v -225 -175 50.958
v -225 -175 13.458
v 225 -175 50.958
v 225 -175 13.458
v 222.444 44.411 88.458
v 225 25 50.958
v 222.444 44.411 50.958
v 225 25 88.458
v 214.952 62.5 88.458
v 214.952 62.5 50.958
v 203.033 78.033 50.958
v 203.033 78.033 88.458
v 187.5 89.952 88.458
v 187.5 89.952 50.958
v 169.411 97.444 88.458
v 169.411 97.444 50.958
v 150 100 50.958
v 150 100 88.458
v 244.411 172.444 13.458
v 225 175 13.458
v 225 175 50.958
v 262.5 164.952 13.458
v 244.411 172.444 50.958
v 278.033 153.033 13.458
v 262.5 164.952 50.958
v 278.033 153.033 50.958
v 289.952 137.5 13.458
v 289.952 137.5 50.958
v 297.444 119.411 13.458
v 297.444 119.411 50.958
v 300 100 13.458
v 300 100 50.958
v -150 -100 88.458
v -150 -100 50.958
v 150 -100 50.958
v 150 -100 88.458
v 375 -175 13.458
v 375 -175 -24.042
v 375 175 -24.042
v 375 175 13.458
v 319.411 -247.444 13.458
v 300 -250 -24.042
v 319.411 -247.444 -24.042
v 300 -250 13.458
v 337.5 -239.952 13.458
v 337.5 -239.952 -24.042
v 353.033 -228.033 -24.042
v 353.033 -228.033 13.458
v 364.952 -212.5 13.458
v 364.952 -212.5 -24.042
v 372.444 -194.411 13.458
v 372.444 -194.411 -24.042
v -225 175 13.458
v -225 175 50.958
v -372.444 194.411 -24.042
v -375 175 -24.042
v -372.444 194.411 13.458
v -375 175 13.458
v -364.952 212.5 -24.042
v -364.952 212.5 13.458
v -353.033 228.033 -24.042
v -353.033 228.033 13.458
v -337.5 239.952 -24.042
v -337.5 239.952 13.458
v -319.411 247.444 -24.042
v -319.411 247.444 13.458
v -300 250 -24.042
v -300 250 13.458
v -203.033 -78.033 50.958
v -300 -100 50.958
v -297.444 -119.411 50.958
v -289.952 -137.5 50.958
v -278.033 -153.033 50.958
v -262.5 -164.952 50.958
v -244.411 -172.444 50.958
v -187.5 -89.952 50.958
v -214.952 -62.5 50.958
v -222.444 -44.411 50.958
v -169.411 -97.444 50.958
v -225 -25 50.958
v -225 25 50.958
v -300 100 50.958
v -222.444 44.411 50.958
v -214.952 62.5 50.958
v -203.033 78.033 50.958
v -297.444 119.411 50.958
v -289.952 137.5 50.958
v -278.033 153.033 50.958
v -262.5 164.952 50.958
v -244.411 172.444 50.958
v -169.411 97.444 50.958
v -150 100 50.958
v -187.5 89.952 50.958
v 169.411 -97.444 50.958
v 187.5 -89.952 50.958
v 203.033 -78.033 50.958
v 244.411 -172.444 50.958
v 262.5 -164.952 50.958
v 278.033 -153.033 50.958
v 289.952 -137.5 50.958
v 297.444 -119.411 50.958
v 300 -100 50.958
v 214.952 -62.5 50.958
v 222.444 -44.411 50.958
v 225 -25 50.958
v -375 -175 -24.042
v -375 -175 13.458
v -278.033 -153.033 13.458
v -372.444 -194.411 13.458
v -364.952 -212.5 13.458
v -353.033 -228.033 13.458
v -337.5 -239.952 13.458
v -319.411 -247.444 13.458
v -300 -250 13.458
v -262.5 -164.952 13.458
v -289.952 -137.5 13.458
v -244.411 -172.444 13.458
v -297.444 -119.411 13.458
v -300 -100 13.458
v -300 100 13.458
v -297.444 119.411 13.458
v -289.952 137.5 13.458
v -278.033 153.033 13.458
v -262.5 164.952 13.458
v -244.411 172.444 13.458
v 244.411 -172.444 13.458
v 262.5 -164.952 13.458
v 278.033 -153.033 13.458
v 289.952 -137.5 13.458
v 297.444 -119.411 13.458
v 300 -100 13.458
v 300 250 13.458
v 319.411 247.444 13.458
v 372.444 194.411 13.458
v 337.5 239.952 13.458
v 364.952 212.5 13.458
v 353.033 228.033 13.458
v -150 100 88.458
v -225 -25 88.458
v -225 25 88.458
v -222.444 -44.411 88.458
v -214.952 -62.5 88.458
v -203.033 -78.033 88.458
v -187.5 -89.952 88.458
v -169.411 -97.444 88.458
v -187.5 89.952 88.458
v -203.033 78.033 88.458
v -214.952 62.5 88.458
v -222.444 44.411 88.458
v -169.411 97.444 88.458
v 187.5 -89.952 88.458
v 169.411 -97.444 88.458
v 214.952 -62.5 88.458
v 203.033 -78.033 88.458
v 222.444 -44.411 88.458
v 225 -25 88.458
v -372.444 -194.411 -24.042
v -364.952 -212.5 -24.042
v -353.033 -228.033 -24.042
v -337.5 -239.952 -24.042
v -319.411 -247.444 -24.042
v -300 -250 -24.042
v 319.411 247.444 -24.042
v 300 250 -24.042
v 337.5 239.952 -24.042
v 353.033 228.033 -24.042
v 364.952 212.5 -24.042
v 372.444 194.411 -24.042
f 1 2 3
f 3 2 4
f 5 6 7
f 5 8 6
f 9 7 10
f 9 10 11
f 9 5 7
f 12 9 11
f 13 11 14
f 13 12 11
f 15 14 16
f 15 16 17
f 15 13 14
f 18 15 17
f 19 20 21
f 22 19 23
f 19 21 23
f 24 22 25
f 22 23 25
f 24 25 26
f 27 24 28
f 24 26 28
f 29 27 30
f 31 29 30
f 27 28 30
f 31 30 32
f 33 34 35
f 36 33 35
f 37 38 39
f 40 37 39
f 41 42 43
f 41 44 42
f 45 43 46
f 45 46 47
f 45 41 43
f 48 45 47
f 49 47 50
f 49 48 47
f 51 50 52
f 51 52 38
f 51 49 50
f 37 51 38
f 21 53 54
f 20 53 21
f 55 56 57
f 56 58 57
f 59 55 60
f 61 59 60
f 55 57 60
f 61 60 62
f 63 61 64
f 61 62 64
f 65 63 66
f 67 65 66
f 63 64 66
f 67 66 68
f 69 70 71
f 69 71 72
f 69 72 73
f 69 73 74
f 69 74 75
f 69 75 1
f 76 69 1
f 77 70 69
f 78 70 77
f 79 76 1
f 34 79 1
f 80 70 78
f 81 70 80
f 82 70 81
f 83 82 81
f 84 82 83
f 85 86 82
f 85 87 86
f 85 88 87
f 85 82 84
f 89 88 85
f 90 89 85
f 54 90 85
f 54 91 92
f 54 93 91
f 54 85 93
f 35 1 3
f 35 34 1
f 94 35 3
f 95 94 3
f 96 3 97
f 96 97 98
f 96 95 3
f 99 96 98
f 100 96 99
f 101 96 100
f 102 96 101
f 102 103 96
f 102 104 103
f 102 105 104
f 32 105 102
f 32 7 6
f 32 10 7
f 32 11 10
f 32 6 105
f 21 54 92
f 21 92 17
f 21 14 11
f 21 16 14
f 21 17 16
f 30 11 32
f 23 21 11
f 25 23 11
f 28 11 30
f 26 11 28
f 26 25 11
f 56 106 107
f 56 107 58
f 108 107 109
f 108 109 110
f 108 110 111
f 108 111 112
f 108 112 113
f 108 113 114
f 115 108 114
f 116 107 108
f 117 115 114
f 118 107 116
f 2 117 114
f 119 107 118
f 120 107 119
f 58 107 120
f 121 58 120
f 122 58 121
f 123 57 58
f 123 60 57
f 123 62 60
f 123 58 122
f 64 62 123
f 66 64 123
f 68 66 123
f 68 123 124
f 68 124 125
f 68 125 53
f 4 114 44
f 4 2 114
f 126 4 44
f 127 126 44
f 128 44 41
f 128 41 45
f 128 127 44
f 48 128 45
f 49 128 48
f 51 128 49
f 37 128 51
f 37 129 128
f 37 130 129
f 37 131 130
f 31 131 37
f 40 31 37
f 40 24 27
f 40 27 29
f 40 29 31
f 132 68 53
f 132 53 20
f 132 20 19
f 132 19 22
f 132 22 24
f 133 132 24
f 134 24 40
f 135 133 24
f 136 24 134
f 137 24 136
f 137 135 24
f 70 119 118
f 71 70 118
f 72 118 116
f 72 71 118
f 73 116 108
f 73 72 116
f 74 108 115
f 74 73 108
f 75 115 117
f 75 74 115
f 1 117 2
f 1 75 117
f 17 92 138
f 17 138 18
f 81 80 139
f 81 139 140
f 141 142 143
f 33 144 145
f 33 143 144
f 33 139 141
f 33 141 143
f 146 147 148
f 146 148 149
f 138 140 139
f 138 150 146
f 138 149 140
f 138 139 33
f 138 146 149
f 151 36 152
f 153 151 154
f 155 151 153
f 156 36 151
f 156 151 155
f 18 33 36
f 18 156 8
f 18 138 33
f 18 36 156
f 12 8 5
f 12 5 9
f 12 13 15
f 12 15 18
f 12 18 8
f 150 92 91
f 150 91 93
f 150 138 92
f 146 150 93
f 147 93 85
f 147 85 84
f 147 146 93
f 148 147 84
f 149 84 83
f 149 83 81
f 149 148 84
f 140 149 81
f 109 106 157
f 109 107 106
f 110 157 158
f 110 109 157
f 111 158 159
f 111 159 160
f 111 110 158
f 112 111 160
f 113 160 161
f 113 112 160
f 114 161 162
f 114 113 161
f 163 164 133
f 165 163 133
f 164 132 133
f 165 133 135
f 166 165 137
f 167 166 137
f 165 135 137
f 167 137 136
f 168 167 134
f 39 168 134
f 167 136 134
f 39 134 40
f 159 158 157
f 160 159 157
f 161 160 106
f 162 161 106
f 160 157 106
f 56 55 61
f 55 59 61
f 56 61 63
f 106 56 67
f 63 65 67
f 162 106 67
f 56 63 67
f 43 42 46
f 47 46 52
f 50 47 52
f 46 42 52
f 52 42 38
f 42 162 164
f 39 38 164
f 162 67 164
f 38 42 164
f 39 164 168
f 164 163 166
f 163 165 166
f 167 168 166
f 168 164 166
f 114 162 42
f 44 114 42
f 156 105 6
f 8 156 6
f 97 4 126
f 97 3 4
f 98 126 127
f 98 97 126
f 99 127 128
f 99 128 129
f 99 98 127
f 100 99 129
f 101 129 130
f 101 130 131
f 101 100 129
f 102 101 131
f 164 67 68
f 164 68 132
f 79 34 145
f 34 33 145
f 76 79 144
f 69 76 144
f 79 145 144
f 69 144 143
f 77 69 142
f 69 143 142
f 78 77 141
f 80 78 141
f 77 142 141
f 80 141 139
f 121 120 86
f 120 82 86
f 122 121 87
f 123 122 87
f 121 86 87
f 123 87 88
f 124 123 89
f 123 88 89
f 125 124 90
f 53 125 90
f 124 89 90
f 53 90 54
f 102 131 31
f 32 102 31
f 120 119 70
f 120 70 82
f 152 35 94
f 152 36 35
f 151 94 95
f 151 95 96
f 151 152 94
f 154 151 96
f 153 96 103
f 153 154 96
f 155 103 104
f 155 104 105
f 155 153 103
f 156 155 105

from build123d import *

# Parameters (mm, degrees)
SKETCH2_W           = 300
SKETCH2_H           = 200
BOSS_EXTRUDE1_DEPTH = 15
SKETCH3_W           = 240
SKETCH3_H           = 140
BOSS_EXTRUDE2_DEPTH = 15
SKETCH4_W           = 180
SKETCH4_H           = 80
BOSS_EXTRUDE3_DEPTH = 15
FILLET1_R           = 30
FILLET2_R           = 30
FILLET3_R           = 30
SCALE2_SCALE        = 2.5


with BuildPart() as part:
    # Sketch2 → Boss-Extrude1 (new body)
    with BuildSketch(Plane.XY):
        Rectangle(SKETCH2_W, SKETCH2_H)
    extrude(amount=BOSS_EXTRUDE1_DEPTH)

    # Sketch3 → Boss-Extrude2 (add)
    with BuildSketch(Plane.XY.offset(15)):
        Rectangle(SKETCH3_W, SKETCH3_H)
    extrude(amount=BOSS_EXTRUDE2_DEPTH)

    # Sketch4 → Boss-Extrude3 (add)
    with BuildSketch(Plane.XY.offset(30)):
        Rectangle(SKETCH4_W, SKETCH4_H)
    extrude(amount=BOSS_EXTRUDE3_DEPTH)

    # Fillet1
    fillet1_edges = [part.edges().sort_by_distance(p)[0] for p in [
        (-90, 40, 37.5),
        (-90, -40, 37.5),
        (90, -40, 37.5),
        (90, 40, 37.5),
    ]]
    fillet(fillet1_edges, radius=FILLET1_R)

    # Fillet2
    fillet2_edges = [part.edges().sort_by_distance(p)[0] for p in [
        (-120, 70, 22.5),
        (-120, -70, 22.5),
        (120, -70, 22.5),
        (120, 70, 22.5),
    ]]
    fillet(fillet2_edges, radius=FILLET2_R)

    # Fillet3
    fillet3_edges = [part.edges().sort_by_distance(p)[0] for p in [
        (150, -100, 7.5),
        (-150, -100, 7.5),
        (-150, 100, 7.5),
        (150, 100, 7.5),
    ]]
    fillet(fillet3_edges, radius=FILLET3_R)


with BuildPart() as part_1:
    # Scale2: scaled about (0, 0, 16.027771453)
    add(part.part.scale(SCALE2_SCALE).moved(Location((0, 0, -24.041657179))))


solid = part_1.part
